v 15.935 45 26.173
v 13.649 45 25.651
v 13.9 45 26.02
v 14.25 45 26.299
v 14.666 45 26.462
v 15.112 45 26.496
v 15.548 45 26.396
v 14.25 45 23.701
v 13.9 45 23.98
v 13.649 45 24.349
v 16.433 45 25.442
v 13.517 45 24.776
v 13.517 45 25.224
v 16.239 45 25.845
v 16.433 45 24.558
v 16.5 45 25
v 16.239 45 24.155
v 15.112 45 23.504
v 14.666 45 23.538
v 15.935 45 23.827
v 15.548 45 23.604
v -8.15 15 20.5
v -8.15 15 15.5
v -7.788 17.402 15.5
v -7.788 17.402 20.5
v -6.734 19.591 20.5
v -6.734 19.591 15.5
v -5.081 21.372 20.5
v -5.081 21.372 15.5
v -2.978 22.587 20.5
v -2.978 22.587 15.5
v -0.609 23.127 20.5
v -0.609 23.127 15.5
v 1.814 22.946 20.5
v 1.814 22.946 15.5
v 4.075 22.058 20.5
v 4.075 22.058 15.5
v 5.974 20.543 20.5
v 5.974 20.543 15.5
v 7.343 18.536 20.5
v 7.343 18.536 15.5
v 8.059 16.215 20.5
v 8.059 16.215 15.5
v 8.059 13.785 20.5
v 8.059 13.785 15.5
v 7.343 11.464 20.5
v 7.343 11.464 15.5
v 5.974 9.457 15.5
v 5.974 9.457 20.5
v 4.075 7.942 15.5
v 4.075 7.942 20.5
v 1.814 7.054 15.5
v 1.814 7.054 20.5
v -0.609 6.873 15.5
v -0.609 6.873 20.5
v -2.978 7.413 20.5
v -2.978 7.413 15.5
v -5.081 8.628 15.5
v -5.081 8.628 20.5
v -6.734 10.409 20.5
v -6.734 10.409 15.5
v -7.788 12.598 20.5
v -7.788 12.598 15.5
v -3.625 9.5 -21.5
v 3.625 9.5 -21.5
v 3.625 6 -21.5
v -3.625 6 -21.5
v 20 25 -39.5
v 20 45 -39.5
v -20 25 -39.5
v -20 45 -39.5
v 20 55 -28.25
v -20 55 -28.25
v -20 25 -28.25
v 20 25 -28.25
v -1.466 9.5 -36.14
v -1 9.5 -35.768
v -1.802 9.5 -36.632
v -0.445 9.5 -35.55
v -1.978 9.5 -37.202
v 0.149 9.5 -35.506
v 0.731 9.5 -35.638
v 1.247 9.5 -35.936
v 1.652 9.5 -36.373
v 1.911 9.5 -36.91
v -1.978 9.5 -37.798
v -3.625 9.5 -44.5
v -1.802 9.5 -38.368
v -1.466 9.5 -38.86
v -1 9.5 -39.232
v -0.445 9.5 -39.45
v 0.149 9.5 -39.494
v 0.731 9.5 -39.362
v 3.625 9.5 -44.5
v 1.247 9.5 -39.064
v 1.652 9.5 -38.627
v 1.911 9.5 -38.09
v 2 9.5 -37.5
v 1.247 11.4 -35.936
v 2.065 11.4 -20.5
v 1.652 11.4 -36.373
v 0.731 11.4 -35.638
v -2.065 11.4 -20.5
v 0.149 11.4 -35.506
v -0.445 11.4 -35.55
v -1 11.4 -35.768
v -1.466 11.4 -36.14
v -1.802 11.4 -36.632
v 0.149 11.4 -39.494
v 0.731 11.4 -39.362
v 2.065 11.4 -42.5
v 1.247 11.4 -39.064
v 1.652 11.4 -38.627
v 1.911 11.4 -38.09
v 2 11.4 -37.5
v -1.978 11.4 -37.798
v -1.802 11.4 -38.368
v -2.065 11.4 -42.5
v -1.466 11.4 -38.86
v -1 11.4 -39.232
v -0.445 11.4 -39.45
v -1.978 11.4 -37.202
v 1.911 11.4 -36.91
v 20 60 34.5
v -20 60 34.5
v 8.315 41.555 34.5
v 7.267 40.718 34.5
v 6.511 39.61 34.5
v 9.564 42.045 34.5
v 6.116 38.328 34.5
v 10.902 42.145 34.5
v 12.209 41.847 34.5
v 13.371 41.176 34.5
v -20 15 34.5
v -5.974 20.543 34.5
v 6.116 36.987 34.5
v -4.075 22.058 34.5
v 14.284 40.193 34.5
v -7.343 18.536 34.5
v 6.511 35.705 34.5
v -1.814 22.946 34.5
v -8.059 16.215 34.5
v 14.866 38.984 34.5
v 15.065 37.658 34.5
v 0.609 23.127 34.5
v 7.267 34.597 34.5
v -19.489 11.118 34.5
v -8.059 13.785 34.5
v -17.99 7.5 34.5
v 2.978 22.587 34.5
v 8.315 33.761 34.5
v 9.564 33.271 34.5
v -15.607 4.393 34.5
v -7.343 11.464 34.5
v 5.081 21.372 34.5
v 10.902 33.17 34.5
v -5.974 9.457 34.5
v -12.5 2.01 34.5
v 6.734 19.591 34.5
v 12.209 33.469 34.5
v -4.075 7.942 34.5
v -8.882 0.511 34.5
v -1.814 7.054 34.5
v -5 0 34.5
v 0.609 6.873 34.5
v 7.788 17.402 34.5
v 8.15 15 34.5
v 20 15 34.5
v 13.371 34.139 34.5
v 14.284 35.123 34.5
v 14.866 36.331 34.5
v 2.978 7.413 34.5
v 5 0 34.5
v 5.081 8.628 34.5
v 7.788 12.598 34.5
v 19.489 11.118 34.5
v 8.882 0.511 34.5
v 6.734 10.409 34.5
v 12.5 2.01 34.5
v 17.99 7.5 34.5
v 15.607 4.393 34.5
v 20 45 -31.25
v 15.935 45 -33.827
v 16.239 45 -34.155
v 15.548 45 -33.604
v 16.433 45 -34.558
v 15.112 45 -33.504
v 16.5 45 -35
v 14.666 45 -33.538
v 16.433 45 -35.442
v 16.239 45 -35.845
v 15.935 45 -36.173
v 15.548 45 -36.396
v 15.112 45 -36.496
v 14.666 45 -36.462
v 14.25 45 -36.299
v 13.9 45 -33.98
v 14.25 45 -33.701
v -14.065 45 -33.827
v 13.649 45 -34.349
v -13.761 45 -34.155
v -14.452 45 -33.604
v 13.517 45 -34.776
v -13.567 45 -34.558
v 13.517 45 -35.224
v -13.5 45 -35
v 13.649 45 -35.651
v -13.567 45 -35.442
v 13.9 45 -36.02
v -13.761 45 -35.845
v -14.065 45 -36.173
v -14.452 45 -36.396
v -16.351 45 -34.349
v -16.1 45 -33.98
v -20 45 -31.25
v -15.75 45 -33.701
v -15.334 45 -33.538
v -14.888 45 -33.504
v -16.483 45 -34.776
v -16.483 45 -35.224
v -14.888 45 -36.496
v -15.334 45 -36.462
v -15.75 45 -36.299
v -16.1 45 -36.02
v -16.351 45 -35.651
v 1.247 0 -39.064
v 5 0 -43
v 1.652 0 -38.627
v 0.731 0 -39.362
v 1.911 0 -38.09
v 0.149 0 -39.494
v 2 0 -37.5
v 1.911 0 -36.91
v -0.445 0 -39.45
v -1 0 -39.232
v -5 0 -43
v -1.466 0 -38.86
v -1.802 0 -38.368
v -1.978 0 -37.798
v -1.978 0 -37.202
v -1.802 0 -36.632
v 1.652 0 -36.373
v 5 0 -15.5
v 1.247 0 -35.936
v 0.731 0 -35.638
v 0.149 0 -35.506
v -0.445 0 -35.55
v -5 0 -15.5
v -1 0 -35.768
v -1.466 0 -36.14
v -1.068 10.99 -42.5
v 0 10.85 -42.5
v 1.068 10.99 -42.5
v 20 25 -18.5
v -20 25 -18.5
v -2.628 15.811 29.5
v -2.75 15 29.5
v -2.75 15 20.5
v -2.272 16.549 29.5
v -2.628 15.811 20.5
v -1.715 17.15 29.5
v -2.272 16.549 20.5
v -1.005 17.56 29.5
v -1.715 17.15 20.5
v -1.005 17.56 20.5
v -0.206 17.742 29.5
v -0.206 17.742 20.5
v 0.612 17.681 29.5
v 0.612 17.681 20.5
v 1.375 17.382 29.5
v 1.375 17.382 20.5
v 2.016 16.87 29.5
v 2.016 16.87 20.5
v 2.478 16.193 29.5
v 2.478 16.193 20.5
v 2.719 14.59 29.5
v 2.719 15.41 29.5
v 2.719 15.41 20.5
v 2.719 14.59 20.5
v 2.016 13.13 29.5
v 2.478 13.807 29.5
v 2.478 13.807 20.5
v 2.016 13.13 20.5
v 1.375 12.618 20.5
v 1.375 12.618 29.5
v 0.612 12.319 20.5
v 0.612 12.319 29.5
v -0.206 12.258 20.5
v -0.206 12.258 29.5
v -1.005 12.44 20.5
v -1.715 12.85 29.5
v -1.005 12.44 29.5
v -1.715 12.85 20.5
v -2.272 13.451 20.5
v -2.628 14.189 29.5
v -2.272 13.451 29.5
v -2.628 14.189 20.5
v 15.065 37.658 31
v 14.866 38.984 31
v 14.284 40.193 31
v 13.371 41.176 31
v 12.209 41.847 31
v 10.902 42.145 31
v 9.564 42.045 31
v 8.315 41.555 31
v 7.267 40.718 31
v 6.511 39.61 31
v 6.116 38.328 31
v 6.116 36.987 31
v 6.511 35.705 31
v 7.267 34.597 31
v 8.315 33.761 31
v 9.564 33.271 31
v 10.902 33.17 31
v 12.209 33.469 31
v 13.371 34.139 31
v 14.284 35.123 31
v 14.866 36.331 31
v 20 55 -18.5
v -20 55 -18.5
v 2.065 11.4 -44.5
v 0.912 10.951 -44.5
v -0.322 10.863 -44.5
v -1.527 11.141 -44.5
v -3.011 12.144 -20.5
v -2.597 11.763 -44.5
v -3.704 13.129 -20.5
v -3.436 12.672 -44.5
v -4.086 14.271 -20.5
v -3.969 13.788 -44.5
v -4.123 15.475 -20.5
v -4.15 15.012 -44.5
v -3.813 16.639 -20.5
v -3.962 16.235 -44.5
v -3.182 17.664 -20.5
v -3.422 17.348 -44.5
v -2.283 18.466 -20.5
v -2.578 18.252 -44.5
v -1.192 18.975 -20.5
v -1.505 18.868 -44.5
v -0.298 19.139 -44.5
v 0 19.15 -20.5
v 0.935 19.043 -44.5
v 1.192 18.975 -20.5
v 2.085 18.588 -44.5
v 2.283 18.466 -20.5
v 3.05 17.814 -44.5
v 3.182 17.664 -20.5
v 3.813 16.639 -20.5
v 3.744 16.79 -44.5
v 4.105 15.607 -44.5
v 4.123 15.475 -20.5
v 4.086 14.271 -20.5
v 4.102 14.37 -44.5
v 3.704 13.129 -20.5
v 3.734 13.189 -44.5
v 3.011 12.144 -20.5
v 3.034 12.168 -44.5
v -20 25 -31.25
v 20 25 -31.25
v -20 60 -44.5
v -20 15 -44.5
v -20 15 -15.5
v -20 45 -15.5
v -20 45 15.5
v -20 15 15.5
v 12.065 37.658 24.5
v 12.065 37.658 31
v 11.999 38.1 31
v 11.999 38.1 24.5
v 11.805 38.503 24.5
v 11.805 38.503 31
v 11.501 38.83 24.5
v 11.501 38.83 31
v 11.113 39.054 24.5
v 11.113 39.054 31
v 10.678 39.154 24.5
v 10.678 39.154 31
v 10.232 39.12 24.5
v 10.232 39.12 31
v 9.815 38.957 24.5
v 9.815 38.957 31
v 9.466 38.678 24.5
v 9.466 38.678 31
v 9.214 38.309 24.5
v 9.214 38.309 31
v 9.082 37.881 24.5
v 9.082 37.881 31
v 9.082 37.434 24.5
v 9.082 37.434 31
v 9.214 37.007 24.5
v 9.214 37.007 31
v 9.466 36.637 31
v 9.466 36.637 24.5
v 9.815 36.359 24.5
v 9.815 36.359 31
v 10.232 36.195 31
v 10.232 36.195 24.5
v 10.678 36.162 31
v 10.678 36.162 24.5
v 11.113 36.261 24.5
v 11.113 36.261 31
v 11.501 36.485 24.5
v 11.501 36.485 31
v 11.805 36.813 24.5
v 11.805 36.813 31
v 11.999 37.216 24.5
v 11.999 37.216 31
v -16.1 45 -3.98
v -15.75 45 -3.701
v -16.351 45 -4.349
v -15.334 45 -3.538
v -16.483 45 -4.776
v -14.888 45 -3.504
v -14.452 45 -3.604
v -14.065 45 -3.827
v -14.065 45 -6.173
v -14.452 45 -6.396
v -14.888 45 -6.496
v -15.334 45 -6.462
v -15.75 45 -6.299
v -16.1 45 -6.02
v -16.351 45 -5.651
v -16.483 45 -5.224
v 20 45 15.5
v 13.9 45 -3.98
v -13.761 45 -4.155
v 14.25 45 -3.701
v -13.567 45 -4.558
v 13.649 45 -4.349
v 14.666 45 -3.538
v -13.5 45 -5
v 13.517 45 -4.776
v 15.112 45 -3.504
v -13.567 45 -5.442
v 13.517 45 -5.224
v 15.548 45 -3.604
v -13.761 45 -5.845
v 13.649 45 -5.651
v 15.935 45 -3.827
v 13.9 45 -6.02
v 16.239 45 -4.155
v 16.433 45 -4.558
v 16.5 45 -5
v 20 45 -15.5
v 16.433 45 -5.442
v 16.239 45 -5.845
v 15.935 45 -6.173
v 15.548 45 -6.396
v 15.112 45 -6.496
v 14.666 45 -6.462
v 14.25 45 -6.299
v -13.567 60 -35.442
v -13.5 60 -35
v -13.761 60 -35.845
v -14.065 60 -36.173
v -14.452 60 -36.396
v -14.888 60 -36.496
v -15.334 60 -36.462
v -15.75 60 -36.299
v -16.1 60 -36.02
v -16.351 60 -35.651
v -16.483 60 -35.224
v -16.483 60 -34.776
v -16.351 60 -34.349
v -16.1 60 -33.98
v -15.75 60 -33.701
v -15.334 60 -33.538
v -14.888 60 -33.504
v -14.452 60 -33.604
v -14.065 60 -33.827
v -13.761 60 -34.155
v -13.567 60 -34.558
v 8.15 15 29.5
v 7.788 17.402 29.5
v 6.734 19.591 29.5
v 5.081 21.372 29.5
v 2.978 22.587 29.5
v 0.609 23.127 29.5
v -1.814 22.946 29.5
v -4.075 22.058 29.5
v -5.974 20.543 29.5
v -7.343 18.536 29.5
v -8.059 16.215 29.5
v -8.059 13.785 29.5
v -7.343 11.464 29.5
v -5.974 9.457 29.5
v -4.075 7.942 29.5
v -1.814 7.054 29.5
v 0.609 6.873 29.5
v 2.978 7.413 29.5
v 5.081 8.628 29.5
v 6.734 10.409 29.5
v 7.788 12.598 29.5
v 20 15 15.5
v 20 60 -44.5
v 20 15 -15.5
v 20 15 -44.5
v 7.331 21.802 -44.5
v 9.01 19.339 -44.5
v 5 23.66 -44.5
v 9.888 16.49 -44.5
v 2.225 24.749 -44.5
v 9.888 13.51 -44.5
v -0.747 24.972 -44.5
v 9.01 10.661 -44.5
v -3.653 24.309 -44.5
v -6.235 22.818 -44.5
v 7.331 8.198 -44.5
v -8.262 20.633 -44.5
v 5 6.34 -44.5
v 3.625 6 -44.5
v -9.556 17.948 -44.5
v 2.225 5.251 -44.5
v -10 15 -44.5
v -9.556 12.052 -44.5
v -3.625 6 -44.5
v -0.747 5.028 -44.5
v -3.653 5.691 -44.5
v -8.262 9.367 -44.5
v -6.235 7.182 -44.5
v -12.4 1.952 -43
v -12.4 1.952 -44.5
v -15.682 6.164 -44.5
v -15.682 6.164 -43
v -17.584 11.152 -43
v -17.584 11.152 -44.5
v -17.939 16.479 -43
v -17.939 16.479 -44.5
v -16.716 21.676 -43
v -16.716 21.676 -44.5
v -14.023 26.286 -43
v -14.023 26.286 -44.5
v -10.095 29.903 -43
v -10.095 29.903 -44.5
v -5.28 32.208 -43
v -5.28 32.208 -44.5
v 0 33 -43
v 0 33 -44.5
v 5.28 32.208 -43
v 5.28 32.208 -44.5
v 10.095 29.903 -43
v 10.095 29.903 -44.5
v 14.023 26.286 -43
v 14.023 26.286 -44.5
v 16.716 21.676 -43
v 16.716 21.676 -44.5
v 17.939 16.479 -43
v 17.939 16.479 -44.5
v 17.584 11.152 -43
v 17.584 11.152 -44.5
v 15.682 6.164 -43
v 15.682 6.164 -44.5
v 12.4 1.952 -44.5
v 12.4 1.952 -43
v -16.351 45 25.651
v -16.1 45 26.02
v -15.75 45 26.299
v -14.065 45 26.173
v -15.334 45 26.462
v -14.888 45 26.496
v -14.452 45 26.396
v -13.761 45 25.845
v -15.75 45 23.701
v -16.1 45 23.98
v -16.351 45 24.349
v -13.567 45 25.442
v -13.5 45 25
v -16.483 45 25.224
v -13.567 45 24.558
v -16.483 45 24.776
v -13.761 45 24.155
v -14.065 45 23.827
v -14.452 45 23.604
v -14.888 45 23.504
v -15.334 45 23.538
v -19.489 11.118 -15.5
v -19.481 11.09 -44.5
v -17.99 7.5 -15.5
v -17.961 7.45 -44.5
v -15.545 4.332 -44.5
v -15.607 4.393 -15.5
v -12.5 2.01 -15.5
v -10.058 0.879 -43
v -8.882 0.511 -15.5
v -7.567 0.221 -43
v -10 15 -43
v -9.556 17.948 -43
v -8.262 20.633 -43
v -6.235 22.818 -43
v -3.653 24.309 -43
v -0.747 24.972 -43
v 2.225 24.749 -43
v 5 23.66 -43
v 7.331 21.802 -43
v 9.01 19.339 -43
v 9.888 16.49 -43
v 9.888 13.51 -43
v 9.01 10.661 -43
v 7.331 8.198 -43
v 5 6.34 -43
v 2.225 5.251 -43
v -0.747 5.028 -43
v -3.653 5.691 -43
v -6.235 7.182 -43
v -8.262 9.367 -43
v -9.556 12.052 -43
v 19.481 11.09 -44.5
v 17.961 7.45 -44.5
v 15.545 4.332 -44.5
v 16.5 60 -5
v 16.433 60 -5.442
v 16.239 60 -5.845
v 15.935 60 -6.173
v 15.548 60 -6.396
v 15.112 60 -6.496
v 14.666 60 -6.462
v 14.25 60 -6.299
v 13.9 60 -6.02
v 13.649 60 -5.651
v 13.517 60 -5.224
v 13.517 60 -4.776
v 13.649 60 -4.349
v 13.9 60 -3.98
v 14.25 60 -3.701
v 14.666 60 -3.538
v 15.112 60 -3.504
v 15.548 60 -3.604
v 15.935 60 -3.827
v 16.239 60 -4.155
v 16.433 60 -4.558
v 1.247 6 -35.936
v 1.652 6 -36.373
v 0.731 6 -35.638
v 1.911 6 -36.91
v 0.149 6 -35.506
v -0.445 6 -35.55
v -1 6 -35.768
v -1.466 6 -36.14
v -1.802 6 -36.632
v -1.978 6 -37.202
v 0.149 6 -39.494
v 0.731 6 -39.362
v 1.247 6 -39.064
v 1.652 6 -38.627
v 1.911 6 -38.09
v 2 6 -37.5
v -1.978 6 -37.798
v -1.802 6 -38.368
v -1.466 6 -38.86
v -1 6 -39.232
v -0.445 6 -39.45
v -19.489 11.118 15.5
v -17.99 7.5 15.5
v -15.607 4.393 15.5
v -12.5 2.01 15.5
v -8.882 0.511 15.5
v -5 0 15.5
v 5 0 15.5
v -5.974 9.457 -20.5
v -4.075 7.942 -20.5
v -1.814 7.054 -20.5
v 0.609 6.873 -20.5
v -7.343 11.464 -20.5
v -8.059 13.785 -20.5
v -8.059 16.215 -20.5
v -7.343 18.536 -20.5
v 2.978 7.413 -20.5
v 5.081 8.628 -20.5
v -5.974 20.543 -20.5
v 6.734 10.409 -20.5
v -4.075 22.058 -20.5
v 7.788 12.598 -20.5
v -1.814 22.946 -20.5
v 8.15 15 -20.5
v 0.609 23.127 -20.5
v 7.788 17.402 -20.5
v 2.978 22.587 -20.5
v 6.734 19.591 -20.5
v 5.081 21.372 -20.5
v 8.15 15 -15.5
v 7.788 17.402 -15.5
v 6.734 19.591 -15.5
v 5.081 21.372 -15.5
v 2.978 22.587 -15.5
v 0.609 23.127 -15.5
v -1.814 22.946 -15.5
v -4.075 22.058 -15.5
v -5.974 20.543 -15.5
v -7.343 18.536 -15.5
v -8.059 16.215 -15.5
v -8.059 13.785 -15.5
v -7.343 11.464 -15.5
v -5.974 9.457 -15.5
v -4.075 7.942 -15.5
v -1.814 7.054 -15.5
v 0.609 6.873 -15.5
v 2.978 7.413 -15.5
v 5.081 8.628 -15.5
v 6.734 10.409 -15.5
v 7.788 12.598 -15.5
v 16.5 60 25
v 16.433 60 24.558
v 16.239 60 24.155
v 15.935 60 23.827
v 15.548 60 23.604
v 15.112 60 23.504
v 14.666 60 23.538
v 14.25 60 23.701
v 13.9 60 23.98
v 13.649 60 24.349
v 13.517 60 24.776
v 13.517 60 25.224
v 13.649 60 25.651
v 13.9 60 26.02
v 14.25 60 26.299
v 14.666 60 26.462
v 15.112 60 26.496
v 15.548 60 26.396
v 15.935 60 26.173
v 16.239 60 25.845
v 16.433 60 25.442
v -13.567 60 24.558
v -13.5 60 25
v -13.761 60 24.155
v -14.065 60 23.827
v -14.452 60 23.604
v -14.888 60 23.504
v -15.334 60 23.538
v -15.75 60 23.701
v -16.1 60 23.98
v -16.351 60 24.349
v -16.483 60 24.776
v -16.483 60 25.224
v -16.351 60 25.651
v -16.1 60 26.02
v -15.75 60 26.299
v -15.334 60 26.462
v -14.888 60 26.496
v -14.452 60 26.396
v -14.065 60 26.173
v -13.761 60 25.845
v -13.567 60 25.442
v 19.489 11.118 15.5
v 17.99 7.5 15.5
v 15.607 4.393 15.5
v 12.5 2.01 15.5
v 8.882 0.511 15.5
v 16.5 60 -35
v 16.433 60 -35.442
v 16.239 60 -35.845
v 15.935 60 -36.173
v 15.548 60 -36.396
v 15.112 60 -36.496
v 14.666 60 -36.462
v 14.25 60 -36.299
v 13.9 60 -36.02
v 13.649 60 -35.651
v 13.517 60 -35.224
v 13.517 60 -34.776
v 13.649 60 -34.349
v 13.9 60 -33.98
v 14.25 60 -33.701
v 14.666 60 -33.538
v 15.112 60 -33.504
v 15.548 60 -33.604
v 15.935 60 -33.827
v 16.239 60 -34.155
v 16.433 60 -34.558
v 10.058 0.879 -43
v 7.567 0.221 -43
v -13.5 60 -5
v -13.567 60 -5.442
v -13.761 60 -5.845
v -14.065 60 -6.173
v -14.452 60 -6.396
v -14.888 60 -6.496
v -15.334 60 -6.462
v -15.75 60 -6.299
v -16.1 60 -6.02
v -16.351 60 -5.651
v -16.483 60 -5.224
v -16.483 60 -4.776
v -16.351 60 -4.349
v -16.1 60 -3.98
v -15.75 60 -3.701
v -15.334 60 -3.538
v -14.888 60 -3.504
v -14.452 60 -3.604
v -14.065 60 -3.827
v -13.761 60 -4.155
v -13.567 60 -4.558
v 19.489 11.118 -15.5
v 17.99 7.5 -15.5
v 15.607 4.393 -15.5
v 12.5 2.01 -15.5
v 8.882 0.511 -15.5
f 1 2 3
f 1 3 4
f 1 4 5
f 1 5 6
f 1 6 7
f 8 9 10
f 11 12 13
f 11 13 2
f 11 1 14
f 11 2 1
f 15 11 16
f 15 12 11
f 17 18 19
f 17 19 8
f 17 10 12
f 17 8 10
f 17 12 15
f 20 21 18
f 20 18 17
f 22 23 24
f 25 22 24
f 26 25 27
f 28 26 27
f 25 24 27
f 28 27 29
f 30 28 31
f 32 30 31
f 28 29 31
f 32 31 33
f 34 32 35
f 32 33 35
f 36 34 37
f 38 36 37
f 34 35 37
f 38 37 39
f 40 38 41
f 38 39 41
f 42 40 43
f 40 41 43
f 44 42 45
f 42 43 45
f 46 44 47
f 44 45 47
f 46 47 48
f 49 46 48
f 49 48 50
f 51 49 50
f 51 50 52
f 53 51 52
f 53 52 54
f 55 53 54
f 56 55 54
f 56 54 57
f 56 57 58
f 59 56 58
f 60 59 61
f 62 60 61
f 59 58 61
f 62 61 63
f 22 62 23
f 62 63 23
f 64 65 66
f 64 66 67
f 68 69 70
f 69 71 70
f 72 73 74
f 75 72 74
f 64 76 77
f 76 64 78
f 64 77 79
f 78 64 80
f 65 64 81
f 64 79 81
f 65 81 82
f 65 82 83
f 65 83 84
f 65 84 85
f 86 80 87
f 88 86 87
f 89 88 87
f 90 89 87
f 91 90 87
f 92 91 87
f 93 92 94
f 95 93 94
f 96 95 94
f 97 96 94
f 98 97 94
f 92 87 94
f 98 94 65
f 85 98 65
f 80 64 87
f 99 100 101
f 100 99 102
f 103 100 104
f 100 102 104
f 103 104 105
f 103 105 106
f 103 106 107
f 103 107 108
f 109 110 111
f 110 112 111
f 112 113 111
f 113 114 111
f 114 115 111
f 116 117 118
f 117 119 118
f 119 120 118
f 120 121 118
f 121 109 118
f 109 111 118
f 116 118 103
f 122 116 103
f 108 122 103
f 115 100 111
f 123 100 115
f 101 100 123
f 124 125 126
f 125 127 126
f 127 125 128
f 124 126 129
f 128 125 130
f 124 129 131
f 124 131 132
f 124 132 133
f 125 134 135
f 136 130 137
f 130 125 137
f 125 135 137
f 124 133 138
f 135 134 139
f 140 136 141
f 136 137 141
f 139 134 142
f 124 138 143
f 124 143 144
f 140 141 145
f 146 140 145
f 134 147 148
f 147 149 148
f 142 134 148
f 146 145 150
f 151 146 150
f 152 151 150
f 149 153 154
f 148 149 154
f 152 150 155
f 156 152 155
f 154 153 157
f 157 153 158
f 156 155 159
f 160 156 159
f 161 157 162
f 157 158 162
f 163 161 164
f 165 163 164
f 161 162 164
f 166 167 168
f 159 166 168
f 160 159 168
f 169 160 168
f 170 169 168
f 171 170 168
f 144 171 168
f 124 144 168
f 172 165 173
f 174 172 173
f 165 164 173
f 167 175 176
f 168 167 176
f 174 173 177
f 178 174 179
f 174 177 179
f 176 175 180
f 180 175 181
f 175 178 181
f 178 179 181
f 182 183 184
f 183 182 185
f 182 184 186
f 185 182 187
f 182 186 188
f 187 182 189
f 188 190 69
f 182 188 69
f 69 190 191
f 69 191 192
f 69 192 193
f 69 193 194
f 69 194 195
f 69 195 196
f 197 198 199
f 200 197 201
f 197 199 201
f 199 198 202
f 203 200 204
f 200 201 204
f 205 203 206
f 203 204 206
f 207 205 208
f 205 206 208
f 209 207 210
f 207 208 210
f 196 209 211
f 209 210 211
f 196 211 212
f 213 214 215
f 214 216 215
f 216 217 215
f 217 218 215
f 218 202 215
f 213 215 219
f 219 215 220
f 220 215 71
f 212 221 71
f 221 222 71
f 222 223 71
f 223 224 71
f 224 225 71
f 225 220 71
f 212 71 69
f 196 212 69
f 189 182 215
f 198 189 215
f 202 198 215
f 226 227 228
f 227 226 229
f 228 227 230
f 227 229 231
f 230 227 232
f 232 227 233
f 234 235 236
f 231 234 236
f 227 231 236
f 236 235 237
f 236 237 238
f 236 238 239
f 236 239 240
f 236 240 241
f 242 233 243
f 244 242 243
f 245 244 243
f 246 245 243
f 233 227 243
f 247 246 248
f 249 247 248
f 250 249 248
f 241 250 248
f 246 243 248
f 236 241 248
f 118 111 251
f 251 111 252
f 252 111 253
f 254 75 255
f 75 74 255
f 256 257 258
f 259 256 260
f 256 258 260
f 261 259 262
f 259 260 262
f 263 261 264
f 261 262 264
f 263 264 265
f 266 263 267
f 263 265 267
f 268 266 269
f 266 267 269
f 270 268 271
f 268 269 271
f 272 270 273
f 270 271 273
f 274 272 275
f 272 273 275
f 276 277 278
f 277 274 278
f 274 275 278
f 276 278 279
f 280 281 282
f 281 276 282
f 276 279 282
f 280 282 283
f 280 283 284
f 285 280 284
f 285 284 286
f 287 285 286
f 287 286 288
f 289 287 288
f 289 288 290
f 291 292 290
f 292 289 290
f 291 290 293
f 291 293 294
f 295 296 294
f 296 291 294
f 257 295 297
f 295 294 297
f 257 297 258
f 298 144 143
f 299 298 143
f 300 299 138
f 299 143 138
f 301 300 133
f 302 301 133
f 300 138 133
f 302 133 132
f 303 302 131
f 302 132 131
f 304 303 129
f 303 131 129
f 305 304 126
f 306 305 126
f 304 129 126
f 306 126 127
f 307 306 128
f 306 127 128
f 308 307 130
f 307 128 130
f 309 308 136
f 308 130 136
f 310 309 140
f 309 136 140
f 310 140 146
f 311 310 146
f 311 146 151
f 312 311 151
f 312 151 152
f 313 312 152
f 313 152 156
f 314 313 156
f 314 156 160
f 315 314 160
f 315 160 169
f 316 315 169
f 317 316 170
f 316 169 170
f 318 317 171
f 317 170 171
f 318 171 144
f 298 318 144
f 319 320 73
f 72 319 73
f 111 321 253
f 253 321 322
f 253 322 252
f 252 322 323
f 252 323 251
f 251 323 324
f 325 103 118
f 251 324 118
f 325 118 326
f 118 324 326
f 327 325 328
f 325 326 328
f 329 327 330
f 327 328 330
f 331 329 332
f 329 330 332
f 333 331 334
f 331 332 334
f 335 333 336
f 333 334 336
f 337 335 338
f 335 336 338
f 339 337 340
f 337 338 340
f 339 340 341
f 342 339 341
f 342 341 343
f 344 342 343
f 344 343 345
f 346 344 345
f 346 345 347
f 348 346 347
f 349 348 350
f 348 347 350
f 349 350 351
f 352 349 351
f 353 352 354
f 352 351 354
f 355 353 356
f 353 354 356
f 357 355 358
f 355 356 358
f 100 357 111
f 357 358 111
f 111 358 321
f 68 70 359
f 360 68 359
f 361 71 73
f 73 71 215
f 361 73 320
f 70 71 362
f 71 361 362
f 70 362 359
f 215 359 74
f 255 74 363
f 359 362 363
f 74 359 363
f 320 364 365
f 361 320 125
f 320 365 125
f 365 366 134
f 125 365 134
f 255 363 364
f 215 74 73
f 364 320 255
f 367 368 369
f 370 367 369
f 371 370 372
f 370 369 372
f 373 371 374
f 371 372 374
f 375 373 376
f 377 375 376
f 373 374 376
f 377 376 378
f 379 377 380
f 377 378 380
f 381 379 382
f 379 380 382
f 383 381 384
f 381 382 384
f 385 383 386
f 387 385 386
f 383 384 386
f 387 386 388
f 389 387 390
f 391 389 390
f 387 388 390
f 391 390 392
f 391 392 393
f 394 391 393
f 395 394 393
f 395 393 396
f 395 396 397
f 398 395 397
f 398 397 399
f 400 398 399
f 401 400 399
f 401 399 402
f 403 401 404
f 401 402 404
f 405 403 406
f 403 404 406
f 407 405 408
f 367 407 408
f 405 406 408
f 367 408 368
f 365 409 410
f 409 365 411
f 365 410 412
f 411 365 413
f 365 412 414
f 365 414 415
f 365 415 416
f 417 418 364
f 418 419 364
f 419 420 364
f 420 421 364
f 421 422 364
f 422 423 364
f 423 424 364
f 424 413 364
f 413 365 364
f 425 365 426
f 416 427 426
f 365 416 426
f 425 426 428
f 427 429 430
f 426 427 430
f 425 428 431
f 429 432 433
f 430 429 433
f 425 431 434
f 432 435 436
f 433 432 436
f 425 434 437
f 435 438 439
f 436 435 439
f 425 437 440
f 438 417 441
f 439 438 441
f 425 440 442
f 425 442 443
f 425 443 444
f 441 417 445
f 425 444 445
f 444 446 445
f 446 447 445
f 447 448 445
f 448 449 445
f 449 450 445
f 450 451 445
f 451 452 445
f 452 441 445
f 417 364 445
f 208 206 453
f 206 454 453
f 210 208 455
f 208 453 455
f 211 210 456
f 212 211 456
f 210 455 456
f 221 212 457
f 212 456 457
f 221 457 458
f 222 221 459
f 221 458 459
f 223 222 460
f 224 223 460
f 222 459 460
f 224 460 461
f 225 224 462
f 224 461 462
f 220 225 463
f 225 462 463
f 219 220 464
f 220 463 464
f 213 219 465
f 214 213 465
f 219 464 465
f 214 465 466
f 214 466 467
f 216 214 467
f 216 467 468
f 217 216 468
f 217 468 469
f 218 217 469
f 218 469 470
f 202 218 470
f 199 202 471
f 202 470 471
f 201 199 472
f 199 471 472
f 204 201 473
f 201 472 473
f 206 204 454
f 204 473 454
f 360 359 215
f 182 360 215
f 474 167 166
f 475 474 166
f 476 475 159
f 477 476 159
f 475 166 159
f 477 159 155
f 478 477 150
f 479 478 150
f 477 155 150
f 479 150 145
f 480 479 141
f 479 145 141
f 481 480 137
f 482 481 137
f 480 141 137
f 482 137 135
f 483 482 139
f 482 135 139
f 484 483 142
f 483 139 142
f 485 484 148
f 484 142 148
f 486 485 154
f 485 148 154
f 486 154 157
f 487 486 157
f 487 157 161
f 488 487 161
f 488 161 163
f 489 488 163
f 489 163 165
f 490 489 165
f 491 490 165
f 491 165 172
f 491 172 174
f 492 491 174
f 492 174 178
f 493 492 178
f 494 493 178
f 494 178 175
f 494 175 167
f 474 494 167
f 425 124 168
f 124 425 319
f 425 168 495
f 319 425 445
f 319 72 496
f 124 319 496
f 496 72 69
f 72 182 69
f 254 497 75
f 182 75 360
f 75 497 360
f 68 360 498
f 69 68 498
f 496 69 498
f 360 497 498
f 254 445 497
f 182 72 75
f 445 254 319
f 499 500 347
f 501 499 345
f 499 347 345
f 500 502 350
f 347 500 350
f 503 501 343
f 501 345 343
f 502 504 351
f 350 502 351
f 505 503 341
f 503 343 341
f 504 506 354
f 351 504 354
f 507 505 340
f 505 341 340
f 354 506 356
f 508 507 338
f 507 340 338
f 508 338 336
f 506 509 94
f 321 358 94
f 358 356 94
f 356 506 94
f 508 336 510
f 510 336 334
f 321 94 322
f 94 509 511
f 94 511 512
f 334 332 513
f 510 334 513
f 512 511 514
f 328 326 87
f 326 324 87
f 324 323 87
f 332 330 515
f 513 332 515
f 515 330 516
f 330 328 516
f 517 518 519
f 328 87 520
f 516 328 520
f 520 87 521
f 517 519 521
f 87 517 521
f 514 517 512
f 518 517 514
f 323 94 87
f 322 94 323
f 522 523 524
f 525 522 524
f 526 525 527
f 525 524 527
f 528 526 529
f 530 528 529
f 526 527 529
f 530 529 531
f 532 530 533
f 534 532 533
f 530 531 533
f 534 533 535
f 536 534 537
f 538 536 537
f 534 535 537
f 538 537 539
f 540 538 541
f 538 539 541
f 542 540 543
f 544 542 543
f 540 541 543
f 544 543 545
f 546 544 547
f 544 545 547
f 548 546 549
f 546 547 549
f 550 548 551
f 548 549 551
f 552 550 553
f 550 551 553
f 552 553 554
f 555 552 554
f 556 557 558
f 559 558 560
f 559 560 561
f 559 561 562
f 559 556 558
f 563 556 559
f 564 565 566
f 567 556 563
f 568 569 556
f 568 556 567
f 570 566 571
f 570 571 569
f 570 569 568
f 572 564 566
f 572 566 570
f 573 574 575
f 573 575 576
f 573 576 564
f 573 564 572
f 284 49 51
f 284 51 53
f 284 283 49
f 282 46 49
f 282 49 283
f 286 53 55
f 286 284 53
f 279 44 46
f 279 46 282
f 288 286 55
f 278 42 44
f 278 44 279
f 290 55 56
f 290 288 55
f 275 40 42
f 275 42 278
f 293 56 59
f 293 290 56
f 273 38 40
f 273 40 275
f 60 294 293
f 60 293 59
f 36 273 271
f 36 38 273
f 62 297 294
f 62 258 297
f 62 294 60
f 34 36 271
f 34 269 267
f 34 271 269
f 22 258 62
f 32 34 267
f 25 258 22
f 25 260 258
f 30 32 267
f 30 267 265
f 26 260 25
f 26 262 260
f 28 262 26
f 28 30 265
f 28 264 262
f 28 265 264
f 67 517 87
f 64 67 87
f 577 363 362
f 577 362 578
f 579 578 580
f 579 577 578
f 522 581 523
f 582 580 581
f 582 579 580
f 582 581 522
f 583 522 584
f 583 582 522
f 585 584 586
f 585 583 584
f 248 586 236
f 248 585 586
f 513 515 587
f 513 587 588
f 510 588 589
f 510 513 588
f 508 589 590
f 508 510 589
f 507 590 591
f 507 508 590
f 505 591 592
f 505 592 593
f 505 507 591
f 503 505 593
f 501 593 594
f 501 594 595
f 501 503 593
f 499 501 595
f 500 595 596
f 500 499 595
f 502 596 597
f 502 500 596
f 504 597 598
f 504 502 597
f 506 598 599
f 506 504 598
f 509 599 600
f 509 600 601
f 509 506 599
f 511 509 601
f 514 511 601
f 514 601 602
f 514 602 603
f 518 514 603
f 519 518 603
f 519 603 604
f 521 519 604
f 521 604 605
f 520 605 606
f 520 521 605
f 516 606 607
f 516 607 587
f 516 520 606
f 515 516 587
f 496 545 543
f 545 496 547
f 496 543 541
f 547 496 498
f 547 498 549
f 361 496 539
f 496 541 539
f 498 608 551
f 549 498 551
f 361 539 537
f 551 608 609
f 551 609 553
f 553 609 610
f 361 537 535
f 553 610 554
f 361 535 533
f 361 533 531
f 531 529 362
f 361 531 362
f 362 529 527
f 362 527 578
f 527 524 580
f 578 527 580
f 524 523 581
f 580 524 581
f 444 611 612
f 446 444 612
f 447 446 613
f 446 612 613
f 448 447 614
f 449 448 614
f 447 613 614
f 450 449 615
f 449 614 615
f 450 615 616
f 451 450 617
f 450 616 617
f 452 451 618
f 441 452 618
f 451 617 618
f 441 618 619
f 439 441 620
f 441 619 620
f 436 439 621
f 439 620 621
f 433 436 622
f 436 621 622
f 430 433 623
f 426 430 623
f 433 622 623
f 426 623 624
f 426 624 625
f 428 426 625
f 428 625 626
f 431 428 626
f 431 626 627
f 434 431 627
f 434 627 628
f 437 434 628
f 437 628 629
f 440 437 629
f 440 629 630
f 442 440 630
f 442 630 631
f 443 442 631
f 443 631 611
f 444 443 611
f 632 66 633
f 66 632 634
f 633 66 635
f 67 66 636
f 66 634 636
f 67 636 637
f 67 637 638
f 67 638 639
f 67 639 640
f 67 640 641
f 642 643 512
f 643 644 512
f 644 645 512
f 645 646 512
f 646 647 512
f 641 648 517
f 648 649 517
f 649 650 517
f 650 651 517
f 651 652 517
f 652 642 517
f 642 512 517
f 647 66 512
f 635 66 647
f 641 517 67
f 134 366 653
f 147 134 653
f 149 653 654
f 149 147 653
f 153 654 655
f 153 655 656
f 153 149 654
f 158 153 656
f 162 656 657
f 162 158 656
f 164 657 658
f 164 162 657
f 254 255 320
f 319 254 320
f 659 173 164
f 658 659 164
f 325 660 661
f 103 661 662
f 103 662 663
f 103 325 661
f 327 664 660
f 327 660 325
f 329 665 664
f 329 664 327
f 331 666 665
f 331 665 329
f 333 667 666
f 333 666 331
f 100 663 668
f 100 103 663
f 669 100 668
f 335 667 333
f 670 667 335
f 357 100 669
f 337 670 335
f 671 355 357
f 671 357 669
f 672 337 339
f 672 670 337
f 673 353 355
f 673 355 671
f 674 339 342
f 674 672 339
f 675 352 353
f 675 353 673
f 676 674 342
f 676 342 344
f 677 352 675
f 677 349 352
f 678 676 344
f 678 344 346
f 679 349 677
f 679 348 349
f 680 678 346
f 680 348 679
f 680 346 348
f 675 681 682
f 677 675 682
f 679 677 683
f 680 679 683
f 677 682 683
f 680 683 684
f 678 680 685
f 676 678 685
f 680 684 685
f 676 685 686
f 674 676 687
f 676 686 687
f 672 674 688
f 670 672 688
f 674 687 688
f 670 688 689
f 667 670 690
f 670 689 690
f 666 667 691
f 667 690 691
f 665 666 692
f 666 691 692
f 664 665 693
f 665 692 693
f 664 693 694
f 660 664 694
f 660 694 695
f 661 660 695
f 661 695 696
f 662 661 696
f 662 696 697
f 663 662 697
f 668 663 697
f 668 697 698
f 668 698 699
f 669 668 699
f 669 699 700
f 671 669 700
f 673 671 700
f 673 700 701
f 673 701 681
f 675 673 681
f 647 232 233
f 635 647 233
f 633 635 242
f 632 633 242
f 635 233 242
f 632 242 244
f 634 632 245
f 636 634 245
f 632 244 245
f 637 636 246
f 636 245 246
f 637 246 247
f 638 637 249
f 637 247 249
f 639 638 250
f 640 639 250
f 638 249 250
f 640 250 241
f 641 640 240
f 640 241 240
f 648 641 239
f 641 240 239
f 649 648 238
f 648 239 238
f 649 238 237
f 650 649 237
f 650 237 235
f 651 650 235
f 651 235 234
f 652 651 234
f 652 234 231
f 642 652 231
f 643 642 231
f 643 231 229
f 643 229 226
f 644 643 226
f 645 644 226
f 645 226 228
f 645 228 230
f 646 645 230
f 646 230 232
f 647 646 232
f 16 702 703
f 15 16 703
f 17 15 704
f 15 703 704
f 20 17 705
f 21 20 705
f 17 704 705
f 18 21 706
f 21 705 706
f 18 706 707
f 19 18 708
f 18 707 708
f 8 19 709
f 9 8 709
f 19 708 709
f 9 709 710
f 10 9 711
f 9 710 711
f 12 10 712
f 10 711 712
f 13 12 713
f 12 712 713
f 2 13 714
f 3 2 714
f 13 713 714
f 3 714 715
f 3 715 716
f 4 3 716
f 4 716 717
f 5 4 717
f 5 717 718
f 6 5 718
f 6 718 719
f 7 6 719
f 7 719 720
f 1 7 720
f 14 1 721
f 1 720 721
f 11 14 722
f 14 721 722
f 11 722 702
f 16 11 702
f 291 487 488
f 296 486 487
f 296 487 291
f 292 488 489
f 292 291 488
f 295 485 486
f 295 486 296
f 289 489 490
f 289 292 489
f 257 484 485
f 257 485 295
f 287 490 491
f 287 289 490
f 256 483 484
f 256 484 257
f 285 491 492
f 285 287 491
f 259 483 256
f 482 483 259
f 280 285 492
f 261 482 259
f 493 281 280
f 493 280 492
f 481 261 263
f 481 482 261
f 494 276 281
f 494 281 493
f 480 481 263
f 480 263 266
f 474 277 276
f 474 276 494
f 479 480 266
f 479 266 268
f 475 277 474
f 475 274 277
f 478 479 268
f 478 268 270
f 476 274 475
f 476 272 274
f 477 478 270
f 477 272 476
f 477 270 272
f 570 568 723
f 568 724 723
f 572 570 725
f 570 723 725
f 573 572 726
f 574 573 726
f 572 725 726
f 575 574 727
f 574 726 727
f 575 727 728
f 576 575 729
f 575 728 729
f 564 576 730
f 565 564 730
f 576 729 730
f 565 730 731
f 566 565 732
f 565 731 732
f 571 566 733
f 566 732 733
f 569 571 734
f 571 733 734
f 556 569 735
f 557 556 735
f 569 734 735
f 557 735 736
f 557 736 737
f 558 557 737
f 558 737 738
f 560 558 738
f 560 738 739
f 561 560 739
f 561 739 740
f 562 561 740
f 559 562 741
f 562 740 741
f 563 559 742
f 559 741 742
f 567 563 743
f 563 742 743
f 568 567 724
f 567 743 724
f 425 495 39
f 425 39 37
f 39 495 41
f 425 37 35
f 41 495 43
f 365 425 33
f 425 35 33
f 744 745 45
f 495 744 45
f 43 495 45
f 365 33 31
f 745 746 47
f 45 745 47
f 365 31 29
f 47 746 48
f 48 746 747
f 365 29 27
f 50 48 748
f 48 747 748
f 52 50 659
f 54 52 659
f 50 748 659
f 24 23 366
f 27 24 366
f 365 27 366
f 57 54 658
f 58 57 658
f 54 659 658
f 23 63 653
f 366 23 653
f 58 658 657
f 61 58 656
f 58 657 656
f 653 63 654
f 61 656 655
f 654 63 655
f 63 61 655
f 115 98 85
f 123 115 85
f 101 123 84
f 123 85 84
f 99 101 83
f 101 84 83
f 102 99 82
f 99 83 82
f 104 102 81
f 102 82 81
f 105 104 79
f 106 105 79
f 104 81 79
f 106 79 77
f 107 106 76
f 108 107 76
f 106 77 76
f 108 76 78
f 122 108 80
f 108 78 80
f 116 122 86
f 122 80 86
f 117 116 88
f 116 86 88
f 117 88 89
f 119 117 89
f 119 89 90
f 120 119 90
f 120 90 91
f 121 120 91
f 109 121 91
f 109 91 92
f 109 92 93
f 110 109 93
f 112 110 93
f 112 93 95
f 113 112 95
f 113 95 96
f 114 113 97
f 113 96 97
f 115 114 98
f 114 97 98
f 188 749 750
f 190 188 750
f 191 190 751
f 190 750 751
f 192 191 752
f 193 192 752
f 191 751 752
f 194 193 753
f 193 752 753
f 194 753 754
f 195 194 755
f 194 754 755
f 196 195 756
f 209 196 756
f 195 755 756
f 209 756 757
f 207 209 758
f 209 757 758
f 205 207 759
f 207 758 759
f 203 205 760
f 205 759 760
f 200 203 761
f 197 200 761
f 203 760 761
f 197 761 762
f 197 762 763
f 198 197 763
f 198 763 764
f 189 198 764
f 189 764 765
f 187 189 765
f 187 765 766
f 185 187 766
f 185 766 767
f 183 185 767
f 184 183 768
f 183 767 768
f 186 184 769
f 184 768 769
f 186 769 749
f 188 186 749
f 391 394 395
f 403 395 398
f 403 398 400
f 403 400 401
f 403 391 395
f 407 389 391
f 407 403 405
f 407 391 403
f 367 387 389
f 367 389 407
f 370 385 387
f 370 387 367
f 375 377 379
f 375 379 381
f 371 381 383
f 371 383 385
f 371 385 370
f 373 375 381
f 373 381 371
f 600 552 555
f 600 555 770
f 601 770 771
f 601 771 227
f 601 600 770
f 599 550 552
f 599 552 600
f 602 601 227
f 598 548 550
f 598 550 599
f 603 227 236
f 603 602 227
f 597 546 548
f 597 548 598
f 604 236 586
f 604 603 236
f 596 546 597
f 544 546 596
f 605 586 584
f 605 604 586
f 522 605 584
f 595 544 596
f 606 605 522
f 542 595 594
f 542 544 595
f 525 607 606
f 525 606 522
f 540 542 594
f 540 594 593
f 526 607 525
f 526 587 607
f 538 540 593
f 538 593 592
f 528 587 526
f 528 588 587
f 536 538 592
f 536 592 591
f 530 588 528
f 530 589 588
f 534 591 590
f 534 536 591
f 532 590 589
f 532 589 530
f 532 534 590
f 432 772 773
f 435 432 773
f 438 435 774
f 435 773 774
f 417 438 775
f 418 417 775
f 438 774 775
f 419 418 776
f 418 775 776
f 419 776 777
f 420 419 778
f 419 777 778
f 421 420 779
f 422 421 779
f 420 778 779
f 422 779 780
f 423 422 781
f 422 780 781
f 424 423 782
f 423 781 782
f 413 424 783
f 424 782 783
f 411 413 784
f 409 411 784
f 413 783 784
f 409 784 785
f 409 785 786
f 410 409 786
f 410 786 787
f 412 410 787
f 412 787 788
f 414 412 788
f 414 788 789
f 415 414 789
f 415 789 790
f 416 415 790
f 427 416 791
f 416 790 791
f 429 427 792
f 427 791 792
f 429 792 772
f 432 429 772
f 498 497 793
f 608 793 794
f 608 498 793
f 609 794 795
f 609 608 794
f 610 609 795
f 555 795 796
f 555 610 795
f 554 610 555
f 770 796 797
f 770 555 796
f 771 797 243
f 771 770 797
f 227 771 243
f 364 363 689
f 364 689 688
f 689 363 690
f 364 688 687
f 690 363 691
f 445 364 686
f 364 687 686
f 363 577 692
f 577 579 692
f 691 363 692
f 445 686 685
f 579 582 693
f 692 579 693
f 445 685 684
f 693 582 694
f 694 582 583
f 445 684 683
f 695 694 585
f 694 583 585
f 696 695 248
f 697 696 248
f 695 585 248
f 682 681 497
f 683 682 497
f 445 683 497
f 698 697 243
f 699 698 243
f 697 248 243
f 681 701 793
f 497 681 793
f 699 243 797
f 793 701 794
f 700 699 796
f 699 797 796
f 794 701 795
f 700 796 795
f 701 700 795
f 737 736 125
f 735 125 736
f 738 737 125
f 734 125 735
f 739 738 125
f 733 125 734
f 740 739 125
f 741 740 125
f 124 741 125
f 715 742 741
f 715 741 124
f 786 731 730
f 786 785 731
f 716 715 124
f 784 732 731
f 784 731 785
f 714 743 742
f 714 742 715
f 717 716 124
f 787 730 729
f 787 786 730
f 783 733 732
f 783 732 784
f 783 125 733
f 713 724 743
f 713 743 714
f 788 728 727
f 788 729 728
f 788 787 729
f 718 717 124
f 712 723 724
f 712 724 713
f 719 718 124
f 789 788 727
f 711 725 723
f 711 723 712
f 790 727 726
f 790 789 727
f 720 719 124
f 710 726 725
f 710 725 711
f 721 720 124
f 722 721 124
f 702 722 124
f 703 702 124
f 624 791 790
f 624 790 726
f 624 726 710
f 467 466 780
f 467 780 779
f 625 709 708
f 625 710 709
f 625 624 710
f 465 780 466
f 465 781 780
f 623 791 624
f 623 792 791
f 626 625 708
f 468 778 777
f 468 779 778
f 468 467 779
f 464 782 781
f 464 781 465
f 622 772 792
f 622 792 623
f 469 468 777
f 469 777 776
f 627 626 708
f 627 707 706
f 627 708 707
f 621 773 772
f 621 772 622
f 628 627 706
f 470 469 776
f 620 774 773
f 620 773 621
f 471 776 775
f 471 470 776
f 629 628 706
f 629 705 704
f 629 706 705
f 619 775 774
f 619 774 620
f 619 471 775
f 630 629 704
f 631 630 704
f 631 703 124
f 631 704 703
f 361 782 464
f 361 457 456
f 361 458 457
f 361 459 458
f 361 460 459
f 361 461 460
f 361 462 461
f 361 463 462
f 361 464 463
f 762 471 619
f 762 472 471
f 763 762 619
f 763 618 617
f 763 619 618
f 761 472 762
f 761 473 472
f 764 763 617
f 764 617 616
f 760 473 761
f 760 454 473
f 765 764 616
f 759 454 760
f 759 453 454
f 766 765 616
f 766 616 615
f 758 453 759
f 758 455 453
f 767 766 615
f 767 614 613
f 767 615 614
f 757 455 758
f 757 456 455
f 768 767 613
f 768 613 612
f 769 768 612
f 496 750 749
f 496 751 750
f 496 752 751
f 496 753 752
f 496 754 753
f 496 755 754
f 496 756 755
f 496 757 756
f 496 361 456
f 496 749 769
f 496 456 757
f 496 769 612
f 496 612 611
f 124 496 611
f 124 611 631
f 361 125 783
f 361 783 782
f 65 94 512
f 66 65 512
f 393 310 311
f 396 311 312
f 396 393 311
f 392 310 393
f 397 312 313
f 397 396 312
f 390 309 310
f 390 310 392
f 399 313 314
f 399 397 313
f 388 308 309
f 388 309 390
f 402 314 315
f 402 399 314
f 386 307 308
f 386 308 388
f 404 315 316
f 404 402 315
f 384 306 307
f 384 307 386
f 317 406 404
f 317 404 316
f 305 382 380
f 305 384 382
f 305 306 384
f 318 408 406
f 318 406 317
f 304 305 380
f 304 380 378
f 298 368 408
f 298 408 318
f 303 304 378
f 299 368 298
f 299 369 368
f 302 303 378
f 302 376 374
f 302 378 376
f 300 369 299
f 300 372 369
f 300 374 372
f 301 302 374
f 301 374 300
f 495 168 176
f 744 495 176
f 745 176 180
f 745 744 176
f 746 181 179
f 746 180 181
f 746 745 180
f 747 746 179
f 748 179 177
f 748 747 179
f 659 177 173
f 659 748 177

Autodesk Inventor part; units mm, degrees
ref_plane "YZ Plane" through (0, 0, 0) normal (1, 0, 0) x (0, 1, 0)
ref_plane "XZ Plane" through (0, 0, 0) normal (0, 1, 0) x (-1, 0, 0)
ref_plane "XY Plane" through (0, 0, 0) normal (0, 0, 1) x (1, 0, 0)
sketch "Sketch1" plane through (0, 0, 0) normal (0, 1, 0) x (-1, 0, 0)
  line L0 (20, 34.5) -> (-20, 34.5)
  line L1 (-20, 34.5) -> (-20, 15.5)
  line L2 (-20, 15.5) -> (20, 15.5)
  line L3 (20, 15.5) -> (20, 34.5)
  line L4 (20, -15.5) -> (-20, -15.5)
  line L5 (-20, -15.5) -> (-20, -44.5)
  line L6 (-20, -44.5) -> (20, -44.5)
  line L7 (20, -44.5) -> (20, -15.5)
  point P0 (0, 0)
  dimension "d0" = 31
  dimension "d1" = 19
  dimension "d2" = 40
  dimension "d3" = 20
  dimension "d4" = 29
  dimension "d50" = 15.5
sketch "Sketch1 outline for Extrusion1" plane through (0, 0, 0) normal (0, 1, 0) x (-1, 0, 0)
  line L0 (20, -15.5) -> (-20, -15.5)
  line L1 (20, -44.5) -> (20, -15.5)
  line L2 (-20, -44.5) -> (20, -44.5)
  line L3 (-20, -15.5) -> (-20, -44.5)
  line L4 (20, 34.5) -> (-20, 34.5)
  line L5 (20, 15.5) -> (20, 34.5)
  line L6 (-20, 15.5) -> (20, 15.5)
  line L7 (-20, 34.5) -> (-20, 15.5)
extrude "Extrusion1" add sketch "Sketch1 outline for Extrusion1" along normal blind 45
sketch "Sketch2" plane through (20, 0, -44.5) normal (0, 0, -1) x (-1, 0, 0)
  circle A0 centre (20, 15) radius 8.125
  line L0 (0, 0) -> (40, 0) projected
  circle A1 centre (20, 15) radius 2.75
  point P0 (20, 0)
  point P1 (20, 0)
  dimension "d7" = 16.25
  dimension "d8" = 15
  dimension "d9" = 5.5
sketch "Sketch2 outline for Extrusion2" plane through (20, 0, -44.5) normal (0, 0, -1) x (-1, 0, 0)
  circle A0 centre (20, 15) radius 2.75
extrude "Extrusion2" cut sketch "Sketch2 outline for Extrusion2" against normal blind 274.75
sketch "Sketch3" plane through (0, 45, 0) normal (0, 1, 0) x (1, 0, 0)
  line L0 (20, -34.5) -> (20, -15.5) projected
  line L1 (-20, 44.5) -> (-20, 15.5) projected
  line L2 (20, -34.5) -> (-20, -34.5)
  line L3 (-20, -34.5) -> (-20, 44.5)
  line L4 (-20, 44.5) -> (20, 44.5)
  line L5 (20, 44.5) -> (20, -34.5)
  point P0 (0, 0)
sketch "Sketch3 outline for Extrusion3" plane through (0, 45, 0) normal (0, 1, 0) x (1, 0, 0)
  line L0 (-20, -34.5) -> (20, -34.5)
  line L1 (-20, 15.5) -> (-20, -34.5)
  line L2 (-20, 44.5) -> (-20, 15.5)
  line L3 (20, 44.5) -> (-20, 44.5)
  line L4 (20, -15.5) -> (20, 44.5)
  line L5 (20, -34.5) -> (20, -15.5)
extrude "Extrusion3" add sketch "Sketch3 outline for Extrusion3" along normal blind 15
sketch "Sketch4" plane through (-20, 0, -44.5) normal (-1, 0, 0) x (0, 0, 1)
  line L0 (5, 55) -> (26, 55)
  line L1 (26, 55) -> (26, 25)
  line L2 (26, 25) -> (5, 25)
  line L3 (5, 25) -> (5, 55)
  line L4 (0, 0) -> (0, 60) projected
  line L5 (29, 0) -> (29, 45) projected
  line L6 (0, 60) -> (79, 60) projected
  line L7 (0, 0) -> (29, 0) projected
  line L8 (13.25, 55) -> (16.25, 55)
  line L9 (16.25, 55) -> (16.25, 25)
  line L10 (16.25, 25) -> (13.25, 25)
  line L11 (13.25, 25) -> (13.25, 55)
  line L12 (5, 55) -> (13.25, 55)
  line L13 (13.25, 45) -> (5, 45)
  point P0 (44.5, 0)
  dimension "d14" = 5
  dimension "d15" = 3
  dimension "d16" = 5
  dimension "d18" = 3
  dimension "d19" = 9.75
  dimension "d45" = 25
sketch "Sketch4 outline for Extrusion4" plane through (-20, 0, -44.5) normal (-1, 0, 0) x (0, 0, 1)
  line L0 (26, 25) -> (26, 55)
  line L1 (16.25, 25) -> (26, 25)
  line L2 (16.25, 55) -> (16.25, 25)
  line L3 (26, 55) -> (16.25, 55)
  line L4 (13.25, 45) -> (5, 45)
  line L5 (13.25, 25) -> (13.25, 45)
  line L6 (5, 25) -> (13.25, 25)
  line L7 (5, 45) -> (5, 25)
extrude "Extrusion4" cut sketch "Sketch4 outline for Extrusion4" against normal blind 100
sketch "Sketch5" plane through (20, 0, -44.5) normal (0, 0, -1) x (-1, 0, 0)
  circle A0 centre (20, 15) radius 2.75
  circle A1 centre (20, 15) radius 4.15
  line L0 (17.935418, 11.4) -> (22.064582, 11.4)
  point P0 (20, 0)
  dimension "d22" = 8.3
  dimension "d24" = 3.6
sketch "Sketch5 outline for Extrusion5" plane through (20, 0, -44.5) normal (0, 0, -1) x (-1, 0, 0)
  line L0 (17.935418, 11.4) -> (22.064582, 11.4)
  arc A0 (22.064582, 11.4) -> (17.935418, 11.4) centre (20, 15) ccw
  circle A1 centre (20, 15) radius 2.75
extrude "Extrusion5" cut sketch "Sketch5 outline for Extrusion5" against normal blind 25
sketch "Sketch6" plane through (20, 0, -44.5) normal (0, 0, -1) x (-1, 0, 0)
  line L0 (16.375, 9.5) -> (23.625, 9.5)
  line L1 (23.625, 9.5) -> (23.625, 6)
  line L2 (23.625, 6) -> (16.375, 6)
  line L3 (16.375, 6) -> (16.375, 9.5)
  line L4 (0, 0) -> (40, 0) projected
  circle A0 centre (20, 15) radius 2.75 projected
  point P0 (20, 0)
  point P1 (20, 0)
  dimension "d27" = 3.5
  dimension "d28" = 7.25
  dimension "d29" = 3.625
  dimension "d30" = 5.5
sketch "Sketch6 outline for Extrusion6" plane through (20, 0, -44.5) normal (0, 0, -1) x (-1, 0, 0)
  line L0 (16.375, 9.5) -> (16.375, 6)
  line L1 (23.625, 9.5) -> (16.375, 9.5)
  line L2 (23.625, 6) -> (23.625, 9.5)
  line L3 (16.375, 6) -> (23.625, 6)
extrude "Extrusion6" cut sketch "Sketch6 outline for Extrusion6" against normal blind 23
sketch "Sketch7" plane through (0, 0, 0) normal (0, -1, 0) x (1, 0, 0)
  circle A0 centre (0, -37.5) radius 2
  point P0 (0, 0)
  dimension "d33" = 4
  dimension "d34" = 37.5
sketch "Sketch7 outline for Extrusion7" plane through (0, 0, 0) normal (0, -1, 0) x (1, 0, 0)
  circle A0 centre (0, -37.5) radius 2
extrude "Extrusion7" cut sketch "Sketch7 outline for Extrusion7" against normal blind 15.5
sketch "Sketch8" plane through (-20, 0, -15.5) normal (0, 0, 1) x (1, 0, 0)
  circle A0 centre (20, 15) radius 2.75 projected
  circle A1 centre (20, 15) radius 8.15
  point P0 (20, 0)
  dimension "d37" = 16.3
sketch "Sketch8 outline for Extrusion8" plane through (-20, 0, -15.5) normal (0, 0, 1) x (1, 0, 0)
  circle A0 centre (20, 15) radius 8.15
  circle A1 centre (20, 15) radius 2.75
extrude "Extrusion8" cut sketch "Sketch8 outline for Extrusion8" against normal blind 5
sketch "Sketch9" plane through (-20, 0, 34.5) normal (0, 0, 1) x (1, 0, 0)
  circle A0 centre (20, 15) radius 2.75 projected
  circle A1 centre (20, 15) radius 8.15
  point P0 (20, 0)
sketch "Sketch9 outline for Extrusion9" plane through (-20, 0, 34.5) normal (0, 0, 1) x (1, 0, 0)
  circle A0 centre (20, 15) radius 8.15
  circle A1 centre (20, 15) radius 2.75
extrude "Extrusion9" cut sketch "Sketch9 outline for Extrusion9" against normal blind 5
sketch "Sketch10" plane through (20, 0, 15.5) normal (0, 0, -1) x (-1, 0, 0)
  circle A0 centre (20, 15) radius 2.75 projected
  circle A1 centre (20, 15) radius 8.15
  point P0 (20, 0)
sketch "Sketch10 outline for Extrusion10" plane through (20, 0, 15.5) normal (0, 0, -1) x (-1, 0, 0)
  circle A0 centre (20, 15) radius 8.15
  circle A1 centre (20, 15) radius 2.75
extrude "Extrusion10" cut sketch "Sketch10 outline for Extrusion10" against normal blind 5
fillet "Fillet1" radius 15 4 edges at (-20, 0, -30) (-20, 0, 25) (20, 0, 25) (20, 0, -30)
sketch "Sketch11" plane through (0, 60, 0) normal (0, 1, 0) x (1, 0, 0)
  line L0 (-15, -25) -> (15, -25)
  line L1 (15, -25) -> (15, 35)
  line L2 (15, 35) -> (-15, 35)
  line L3 (-15, 35) -> (-15, -25)
  circle A0 centre (-15, -25) radius 1.5
  circle A1 centre (-15, 35) radius 1.5
  circle A2 centre (15, 35) radius 1.5
  circle A3 centre (15, -25) radius 1.5
  circle A4 centre (-15, 5) radius 1.5
  circle A5 centre (15, 5) radius 1.5
  point P0 (0, 0)
  dimension "d46" = 60
  dimension "d47" = 30
  dimension "d48" = 15
  dimension "d49" = 25
  dimension "d51" = 3
  dimension "d52" = 3
  dimension "d53" = 3
  dimension "d54" = 3
  dimension "d55" = 3
  dimension "d56" = 3
sketch "Sketch11 outline for Extrusion11" plane through (0, 60, 0) normal (0, 1, 0) x (1, 0, 0)
  circle A0 centre (-15, 35) radius 1.5
  circle A1 centre (15, -25) radius 1.5
  circle A2 centre (15, 5) radius 1.5
  circle A3 centre (-15, -25) radius 1.5
  circle A4 centre (15, 35) radius 1.5
  circle A5 centre (-15, 5) radius 1.5
extrude "Extrusion11" cut sketch "Sketch11 outline for Extrusion11" against normal blind 15
sketch "Sketch12" plane through (20, 60, -44.5) normal (0, 0, -1) x (-1, 0, 0)
  arc A0 (22.064582, -48.6) -> (17.935418, -48.6) centre (20, -45) ccw
  circle A1 centre (20, -45) radius 4.15
  point P0 (20, -60)
  point P1 (17.935418, -48.6)
sketch "Sketch12 outline for Extrusion12" plane through (20, 60, -44.5) normal (0, 0, -1) x (-1, 0, 0)
  arc A0 (17.935418, -48.6) -> (22.064582, -48.6) centre (20, -45) ccw
  arc A1 (22.064582, -48.6) -> (17.935418, -48.6) centre (20, -45) ccw
extrude "Extrusion12" cut sketch "Sketch12 outline for Extrusion12" against normal blind 2
sketch "Sketch13" plane through (20, 60, -44.5) normal (0, 0, -1) x (-1, 0, 0)
  arc A0 (22.064582, -48.6) -> (17.935418, -48.6) centre (20, -45) ccw
  circle A1 centre (20, -45) radius 10
  line L0 (20, -35) -> (40, -35)
  line L1 (40, -35) -> (0, -35)
  line L2 (0, -45) -> (0, 0)
  circle A2 centre (20, -45) radius 4.15
  arc A3 (0, -45) -> (15, -60) centre (15, -45) ccw
  line L3 (15, -60) -> (25, -60)
  arc A4 (25, -60) -> (40, -45) centre (25, -45) ccw
  line L4 (40, -45) -> (40, 0)
  line L5 (0, 0) -> (40, 0)
  line L6 (0, -45) -> (0, 0)
  line L7 (23.625, -50.5) -> (23.625, -54)
  line L8 (23.625, -54) -> (16.375, -54)
  line L9 (16.375, -54) -> (16.375, -50.5)
  line L10 (16.375, -50.5) -> (23.625, -50.5)
  circle A5 centre (20, -45) radius 18
  point P0 (20, -60)
  point P1 (40, -35)
  point P2 (17.935418, -48.6)
  point P3 (7.6, -58.047605)
  point P4 (34.96663, -35)
  point P5 (32.4, -58.047605)
  dimension "d61" = 20
  dimension "d64" = 36
sketch "Sketch13 outline for Extrusion13" plane through (20, 60, -44.5) normal (0, 0, -1) x (-1, 0, 0)
  circle A0 centre (20, -45) radius 4.15
  line L0 (23.625, -50.5) -> (16.375, -50.5)
  line L1 (23.625, -54) -> (23.625, -50.5)
  line L2 (16.375, -54) -> (23.625, -54)
  line L3 (16.375, -50.5) -> (16.375, -54)
  arc A1 (32.4, -58.047605) -> (7.6, -58.047605) centre (20, -45) ccw
  arc A2 (25, -60) -> (32.4, -58.047605) centre (25, -45) ccw
  arc A3 (7.6, -58.047605) -> (15, -60) centre (15, -45) ccw
  line L4 (15, -60) -> (25, -60)
  circle A4 centre (20, -45) radius 10
extrude "Extrusion13" cut sketch "Sketch13 outline for Extrusion13" against normal blind 1.5
sketch "Sketch14" plane through (-20, 60, 34.5) normal (0, 0, 1) x (1, 0, 0)
  circle A0 centre (30.565457, -22.342305) radius 4.5
  circle A1 centre (20, -45) radius 2.75
  circle A2 centre (30.565457, -22.342305) radius 1.5
  line L0 (20, -45) -> (20, 2.624244)
  line L1 (20, 2.624244) -> (20, -45)
  line L2 (30.565457, -22.342305) -> (20, -45)
  point P0 (20, -60)
  dimension "d65" = 25
  dimension "d66" = 9
  dimension "d67" = 3
  dimension "d72" = 25
sketch "Sketch14 outline for Extrusion14" plane through (-20, 60, 34.5) normal (0, 0, 1) x (1, 0, 0)
  circle A0 centre (30.565457, -22.342305) radius 1.5
extrude "Extrusion14" cut sketch "Sketch14 outline for Extrusion14" against normal blind 10
sketch "Sketch14 outline for Extrusion15" plane through (-20, 60, 34.5) normal (0, 0, 1) x (1, 0, 0)
  circle A0 centre (30.565457, -22.342305) radius 4.5
  circle A1 centre (30.565457, -22.342305) radius 1.5
extrude "Extrusion15" cut sketch "Sketch14 outline for Extrusion15" against normal blind 3.5
properties part number "Gimbal_1"
